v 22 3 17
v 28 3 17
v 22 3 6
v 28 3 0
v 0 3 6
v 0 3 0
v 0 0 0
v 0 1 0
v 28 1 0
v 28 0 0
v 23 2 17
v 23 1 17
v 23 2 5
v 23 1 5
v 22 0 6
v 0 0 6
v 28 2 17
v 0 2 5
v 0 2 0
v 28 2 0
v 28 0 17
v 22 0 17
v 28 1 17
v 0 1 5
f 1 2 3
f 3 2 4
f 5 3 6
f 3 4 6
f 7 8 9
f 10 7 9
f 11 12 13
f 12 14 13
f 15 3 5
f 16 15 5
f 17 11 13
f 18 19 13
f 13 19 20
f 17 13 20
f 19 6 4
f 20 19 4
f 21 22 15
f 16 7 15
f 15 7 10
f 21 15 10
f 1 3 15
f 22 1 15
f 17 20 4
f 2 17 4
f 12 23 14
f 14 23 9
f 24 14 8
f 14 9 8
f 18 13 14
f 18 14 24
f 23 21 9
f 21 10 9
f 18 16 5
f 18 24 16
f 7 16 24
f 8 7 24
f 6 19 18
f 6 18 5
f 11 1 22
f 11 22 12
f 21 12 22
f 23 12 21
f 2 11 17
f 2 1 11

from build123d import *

# Parameters (mm, degrees)
SKETCH1_W             = 28
SKETCH1_H             = 1
BOSS_EXTRUDE1_DEPTH   = 5
BOSS_EXTRUDE1_2_DEPTH = 5
BOSS_EXTRUDE2_DEPTH   = 1
BOSS_EXTRUDE3_DEPTH   = 11


with BuildPart() as part:
    # Sketch1 → Boss-Extrude1 (new body)
    with BuildSketch(Plane.XY):
        with Locations((14, 0.5)):
            Rectangle(SKETCH1_W, SKETCH1_H)
    extrude(amount=BOSS_EXTRUDE1_DEPTH)



with BuildPart() as body_2:
    # Sketch1 → Boss-Extrude1 2 (new body)
    with BuildSketch(Plane.XY):
        with Locations((14, 2.5)):
            Rectangle(SKETCH1_W, SKETCH1_H)
    extrude(amount=BOSS_EXTRUDE1_2_DEPTH)


with BuildPart() as part_1:
    add(part.part)

    add(body_2.part)  # Boss-Extrude2 merges body 2
    # Sketch2 → Boss-Extrude2 (add)
    with BuildSketch(Plane.XY.offset(5)):
        Polygon((0, 3), (28, 3), (28, 2), (23, 2), (23, 1), (28, 1), (28, 0), (0, 0), align=None)
    extrude(amount=BOSS_EXTRUDE2_DEPTH)

    # Sketch3 → Boss-Extrude3 (add)
    with BuildSketch(Plane.XY.offset(6)):
        Polygon((28, 3), (22, 3), (22, 0), (28, 0), (28, 1), (23, 1), (23, 2), (28, 2), align=None)
    extrude(amount=BOSS_EXTRUDE3_DEPTH)


solid = part_1.part
